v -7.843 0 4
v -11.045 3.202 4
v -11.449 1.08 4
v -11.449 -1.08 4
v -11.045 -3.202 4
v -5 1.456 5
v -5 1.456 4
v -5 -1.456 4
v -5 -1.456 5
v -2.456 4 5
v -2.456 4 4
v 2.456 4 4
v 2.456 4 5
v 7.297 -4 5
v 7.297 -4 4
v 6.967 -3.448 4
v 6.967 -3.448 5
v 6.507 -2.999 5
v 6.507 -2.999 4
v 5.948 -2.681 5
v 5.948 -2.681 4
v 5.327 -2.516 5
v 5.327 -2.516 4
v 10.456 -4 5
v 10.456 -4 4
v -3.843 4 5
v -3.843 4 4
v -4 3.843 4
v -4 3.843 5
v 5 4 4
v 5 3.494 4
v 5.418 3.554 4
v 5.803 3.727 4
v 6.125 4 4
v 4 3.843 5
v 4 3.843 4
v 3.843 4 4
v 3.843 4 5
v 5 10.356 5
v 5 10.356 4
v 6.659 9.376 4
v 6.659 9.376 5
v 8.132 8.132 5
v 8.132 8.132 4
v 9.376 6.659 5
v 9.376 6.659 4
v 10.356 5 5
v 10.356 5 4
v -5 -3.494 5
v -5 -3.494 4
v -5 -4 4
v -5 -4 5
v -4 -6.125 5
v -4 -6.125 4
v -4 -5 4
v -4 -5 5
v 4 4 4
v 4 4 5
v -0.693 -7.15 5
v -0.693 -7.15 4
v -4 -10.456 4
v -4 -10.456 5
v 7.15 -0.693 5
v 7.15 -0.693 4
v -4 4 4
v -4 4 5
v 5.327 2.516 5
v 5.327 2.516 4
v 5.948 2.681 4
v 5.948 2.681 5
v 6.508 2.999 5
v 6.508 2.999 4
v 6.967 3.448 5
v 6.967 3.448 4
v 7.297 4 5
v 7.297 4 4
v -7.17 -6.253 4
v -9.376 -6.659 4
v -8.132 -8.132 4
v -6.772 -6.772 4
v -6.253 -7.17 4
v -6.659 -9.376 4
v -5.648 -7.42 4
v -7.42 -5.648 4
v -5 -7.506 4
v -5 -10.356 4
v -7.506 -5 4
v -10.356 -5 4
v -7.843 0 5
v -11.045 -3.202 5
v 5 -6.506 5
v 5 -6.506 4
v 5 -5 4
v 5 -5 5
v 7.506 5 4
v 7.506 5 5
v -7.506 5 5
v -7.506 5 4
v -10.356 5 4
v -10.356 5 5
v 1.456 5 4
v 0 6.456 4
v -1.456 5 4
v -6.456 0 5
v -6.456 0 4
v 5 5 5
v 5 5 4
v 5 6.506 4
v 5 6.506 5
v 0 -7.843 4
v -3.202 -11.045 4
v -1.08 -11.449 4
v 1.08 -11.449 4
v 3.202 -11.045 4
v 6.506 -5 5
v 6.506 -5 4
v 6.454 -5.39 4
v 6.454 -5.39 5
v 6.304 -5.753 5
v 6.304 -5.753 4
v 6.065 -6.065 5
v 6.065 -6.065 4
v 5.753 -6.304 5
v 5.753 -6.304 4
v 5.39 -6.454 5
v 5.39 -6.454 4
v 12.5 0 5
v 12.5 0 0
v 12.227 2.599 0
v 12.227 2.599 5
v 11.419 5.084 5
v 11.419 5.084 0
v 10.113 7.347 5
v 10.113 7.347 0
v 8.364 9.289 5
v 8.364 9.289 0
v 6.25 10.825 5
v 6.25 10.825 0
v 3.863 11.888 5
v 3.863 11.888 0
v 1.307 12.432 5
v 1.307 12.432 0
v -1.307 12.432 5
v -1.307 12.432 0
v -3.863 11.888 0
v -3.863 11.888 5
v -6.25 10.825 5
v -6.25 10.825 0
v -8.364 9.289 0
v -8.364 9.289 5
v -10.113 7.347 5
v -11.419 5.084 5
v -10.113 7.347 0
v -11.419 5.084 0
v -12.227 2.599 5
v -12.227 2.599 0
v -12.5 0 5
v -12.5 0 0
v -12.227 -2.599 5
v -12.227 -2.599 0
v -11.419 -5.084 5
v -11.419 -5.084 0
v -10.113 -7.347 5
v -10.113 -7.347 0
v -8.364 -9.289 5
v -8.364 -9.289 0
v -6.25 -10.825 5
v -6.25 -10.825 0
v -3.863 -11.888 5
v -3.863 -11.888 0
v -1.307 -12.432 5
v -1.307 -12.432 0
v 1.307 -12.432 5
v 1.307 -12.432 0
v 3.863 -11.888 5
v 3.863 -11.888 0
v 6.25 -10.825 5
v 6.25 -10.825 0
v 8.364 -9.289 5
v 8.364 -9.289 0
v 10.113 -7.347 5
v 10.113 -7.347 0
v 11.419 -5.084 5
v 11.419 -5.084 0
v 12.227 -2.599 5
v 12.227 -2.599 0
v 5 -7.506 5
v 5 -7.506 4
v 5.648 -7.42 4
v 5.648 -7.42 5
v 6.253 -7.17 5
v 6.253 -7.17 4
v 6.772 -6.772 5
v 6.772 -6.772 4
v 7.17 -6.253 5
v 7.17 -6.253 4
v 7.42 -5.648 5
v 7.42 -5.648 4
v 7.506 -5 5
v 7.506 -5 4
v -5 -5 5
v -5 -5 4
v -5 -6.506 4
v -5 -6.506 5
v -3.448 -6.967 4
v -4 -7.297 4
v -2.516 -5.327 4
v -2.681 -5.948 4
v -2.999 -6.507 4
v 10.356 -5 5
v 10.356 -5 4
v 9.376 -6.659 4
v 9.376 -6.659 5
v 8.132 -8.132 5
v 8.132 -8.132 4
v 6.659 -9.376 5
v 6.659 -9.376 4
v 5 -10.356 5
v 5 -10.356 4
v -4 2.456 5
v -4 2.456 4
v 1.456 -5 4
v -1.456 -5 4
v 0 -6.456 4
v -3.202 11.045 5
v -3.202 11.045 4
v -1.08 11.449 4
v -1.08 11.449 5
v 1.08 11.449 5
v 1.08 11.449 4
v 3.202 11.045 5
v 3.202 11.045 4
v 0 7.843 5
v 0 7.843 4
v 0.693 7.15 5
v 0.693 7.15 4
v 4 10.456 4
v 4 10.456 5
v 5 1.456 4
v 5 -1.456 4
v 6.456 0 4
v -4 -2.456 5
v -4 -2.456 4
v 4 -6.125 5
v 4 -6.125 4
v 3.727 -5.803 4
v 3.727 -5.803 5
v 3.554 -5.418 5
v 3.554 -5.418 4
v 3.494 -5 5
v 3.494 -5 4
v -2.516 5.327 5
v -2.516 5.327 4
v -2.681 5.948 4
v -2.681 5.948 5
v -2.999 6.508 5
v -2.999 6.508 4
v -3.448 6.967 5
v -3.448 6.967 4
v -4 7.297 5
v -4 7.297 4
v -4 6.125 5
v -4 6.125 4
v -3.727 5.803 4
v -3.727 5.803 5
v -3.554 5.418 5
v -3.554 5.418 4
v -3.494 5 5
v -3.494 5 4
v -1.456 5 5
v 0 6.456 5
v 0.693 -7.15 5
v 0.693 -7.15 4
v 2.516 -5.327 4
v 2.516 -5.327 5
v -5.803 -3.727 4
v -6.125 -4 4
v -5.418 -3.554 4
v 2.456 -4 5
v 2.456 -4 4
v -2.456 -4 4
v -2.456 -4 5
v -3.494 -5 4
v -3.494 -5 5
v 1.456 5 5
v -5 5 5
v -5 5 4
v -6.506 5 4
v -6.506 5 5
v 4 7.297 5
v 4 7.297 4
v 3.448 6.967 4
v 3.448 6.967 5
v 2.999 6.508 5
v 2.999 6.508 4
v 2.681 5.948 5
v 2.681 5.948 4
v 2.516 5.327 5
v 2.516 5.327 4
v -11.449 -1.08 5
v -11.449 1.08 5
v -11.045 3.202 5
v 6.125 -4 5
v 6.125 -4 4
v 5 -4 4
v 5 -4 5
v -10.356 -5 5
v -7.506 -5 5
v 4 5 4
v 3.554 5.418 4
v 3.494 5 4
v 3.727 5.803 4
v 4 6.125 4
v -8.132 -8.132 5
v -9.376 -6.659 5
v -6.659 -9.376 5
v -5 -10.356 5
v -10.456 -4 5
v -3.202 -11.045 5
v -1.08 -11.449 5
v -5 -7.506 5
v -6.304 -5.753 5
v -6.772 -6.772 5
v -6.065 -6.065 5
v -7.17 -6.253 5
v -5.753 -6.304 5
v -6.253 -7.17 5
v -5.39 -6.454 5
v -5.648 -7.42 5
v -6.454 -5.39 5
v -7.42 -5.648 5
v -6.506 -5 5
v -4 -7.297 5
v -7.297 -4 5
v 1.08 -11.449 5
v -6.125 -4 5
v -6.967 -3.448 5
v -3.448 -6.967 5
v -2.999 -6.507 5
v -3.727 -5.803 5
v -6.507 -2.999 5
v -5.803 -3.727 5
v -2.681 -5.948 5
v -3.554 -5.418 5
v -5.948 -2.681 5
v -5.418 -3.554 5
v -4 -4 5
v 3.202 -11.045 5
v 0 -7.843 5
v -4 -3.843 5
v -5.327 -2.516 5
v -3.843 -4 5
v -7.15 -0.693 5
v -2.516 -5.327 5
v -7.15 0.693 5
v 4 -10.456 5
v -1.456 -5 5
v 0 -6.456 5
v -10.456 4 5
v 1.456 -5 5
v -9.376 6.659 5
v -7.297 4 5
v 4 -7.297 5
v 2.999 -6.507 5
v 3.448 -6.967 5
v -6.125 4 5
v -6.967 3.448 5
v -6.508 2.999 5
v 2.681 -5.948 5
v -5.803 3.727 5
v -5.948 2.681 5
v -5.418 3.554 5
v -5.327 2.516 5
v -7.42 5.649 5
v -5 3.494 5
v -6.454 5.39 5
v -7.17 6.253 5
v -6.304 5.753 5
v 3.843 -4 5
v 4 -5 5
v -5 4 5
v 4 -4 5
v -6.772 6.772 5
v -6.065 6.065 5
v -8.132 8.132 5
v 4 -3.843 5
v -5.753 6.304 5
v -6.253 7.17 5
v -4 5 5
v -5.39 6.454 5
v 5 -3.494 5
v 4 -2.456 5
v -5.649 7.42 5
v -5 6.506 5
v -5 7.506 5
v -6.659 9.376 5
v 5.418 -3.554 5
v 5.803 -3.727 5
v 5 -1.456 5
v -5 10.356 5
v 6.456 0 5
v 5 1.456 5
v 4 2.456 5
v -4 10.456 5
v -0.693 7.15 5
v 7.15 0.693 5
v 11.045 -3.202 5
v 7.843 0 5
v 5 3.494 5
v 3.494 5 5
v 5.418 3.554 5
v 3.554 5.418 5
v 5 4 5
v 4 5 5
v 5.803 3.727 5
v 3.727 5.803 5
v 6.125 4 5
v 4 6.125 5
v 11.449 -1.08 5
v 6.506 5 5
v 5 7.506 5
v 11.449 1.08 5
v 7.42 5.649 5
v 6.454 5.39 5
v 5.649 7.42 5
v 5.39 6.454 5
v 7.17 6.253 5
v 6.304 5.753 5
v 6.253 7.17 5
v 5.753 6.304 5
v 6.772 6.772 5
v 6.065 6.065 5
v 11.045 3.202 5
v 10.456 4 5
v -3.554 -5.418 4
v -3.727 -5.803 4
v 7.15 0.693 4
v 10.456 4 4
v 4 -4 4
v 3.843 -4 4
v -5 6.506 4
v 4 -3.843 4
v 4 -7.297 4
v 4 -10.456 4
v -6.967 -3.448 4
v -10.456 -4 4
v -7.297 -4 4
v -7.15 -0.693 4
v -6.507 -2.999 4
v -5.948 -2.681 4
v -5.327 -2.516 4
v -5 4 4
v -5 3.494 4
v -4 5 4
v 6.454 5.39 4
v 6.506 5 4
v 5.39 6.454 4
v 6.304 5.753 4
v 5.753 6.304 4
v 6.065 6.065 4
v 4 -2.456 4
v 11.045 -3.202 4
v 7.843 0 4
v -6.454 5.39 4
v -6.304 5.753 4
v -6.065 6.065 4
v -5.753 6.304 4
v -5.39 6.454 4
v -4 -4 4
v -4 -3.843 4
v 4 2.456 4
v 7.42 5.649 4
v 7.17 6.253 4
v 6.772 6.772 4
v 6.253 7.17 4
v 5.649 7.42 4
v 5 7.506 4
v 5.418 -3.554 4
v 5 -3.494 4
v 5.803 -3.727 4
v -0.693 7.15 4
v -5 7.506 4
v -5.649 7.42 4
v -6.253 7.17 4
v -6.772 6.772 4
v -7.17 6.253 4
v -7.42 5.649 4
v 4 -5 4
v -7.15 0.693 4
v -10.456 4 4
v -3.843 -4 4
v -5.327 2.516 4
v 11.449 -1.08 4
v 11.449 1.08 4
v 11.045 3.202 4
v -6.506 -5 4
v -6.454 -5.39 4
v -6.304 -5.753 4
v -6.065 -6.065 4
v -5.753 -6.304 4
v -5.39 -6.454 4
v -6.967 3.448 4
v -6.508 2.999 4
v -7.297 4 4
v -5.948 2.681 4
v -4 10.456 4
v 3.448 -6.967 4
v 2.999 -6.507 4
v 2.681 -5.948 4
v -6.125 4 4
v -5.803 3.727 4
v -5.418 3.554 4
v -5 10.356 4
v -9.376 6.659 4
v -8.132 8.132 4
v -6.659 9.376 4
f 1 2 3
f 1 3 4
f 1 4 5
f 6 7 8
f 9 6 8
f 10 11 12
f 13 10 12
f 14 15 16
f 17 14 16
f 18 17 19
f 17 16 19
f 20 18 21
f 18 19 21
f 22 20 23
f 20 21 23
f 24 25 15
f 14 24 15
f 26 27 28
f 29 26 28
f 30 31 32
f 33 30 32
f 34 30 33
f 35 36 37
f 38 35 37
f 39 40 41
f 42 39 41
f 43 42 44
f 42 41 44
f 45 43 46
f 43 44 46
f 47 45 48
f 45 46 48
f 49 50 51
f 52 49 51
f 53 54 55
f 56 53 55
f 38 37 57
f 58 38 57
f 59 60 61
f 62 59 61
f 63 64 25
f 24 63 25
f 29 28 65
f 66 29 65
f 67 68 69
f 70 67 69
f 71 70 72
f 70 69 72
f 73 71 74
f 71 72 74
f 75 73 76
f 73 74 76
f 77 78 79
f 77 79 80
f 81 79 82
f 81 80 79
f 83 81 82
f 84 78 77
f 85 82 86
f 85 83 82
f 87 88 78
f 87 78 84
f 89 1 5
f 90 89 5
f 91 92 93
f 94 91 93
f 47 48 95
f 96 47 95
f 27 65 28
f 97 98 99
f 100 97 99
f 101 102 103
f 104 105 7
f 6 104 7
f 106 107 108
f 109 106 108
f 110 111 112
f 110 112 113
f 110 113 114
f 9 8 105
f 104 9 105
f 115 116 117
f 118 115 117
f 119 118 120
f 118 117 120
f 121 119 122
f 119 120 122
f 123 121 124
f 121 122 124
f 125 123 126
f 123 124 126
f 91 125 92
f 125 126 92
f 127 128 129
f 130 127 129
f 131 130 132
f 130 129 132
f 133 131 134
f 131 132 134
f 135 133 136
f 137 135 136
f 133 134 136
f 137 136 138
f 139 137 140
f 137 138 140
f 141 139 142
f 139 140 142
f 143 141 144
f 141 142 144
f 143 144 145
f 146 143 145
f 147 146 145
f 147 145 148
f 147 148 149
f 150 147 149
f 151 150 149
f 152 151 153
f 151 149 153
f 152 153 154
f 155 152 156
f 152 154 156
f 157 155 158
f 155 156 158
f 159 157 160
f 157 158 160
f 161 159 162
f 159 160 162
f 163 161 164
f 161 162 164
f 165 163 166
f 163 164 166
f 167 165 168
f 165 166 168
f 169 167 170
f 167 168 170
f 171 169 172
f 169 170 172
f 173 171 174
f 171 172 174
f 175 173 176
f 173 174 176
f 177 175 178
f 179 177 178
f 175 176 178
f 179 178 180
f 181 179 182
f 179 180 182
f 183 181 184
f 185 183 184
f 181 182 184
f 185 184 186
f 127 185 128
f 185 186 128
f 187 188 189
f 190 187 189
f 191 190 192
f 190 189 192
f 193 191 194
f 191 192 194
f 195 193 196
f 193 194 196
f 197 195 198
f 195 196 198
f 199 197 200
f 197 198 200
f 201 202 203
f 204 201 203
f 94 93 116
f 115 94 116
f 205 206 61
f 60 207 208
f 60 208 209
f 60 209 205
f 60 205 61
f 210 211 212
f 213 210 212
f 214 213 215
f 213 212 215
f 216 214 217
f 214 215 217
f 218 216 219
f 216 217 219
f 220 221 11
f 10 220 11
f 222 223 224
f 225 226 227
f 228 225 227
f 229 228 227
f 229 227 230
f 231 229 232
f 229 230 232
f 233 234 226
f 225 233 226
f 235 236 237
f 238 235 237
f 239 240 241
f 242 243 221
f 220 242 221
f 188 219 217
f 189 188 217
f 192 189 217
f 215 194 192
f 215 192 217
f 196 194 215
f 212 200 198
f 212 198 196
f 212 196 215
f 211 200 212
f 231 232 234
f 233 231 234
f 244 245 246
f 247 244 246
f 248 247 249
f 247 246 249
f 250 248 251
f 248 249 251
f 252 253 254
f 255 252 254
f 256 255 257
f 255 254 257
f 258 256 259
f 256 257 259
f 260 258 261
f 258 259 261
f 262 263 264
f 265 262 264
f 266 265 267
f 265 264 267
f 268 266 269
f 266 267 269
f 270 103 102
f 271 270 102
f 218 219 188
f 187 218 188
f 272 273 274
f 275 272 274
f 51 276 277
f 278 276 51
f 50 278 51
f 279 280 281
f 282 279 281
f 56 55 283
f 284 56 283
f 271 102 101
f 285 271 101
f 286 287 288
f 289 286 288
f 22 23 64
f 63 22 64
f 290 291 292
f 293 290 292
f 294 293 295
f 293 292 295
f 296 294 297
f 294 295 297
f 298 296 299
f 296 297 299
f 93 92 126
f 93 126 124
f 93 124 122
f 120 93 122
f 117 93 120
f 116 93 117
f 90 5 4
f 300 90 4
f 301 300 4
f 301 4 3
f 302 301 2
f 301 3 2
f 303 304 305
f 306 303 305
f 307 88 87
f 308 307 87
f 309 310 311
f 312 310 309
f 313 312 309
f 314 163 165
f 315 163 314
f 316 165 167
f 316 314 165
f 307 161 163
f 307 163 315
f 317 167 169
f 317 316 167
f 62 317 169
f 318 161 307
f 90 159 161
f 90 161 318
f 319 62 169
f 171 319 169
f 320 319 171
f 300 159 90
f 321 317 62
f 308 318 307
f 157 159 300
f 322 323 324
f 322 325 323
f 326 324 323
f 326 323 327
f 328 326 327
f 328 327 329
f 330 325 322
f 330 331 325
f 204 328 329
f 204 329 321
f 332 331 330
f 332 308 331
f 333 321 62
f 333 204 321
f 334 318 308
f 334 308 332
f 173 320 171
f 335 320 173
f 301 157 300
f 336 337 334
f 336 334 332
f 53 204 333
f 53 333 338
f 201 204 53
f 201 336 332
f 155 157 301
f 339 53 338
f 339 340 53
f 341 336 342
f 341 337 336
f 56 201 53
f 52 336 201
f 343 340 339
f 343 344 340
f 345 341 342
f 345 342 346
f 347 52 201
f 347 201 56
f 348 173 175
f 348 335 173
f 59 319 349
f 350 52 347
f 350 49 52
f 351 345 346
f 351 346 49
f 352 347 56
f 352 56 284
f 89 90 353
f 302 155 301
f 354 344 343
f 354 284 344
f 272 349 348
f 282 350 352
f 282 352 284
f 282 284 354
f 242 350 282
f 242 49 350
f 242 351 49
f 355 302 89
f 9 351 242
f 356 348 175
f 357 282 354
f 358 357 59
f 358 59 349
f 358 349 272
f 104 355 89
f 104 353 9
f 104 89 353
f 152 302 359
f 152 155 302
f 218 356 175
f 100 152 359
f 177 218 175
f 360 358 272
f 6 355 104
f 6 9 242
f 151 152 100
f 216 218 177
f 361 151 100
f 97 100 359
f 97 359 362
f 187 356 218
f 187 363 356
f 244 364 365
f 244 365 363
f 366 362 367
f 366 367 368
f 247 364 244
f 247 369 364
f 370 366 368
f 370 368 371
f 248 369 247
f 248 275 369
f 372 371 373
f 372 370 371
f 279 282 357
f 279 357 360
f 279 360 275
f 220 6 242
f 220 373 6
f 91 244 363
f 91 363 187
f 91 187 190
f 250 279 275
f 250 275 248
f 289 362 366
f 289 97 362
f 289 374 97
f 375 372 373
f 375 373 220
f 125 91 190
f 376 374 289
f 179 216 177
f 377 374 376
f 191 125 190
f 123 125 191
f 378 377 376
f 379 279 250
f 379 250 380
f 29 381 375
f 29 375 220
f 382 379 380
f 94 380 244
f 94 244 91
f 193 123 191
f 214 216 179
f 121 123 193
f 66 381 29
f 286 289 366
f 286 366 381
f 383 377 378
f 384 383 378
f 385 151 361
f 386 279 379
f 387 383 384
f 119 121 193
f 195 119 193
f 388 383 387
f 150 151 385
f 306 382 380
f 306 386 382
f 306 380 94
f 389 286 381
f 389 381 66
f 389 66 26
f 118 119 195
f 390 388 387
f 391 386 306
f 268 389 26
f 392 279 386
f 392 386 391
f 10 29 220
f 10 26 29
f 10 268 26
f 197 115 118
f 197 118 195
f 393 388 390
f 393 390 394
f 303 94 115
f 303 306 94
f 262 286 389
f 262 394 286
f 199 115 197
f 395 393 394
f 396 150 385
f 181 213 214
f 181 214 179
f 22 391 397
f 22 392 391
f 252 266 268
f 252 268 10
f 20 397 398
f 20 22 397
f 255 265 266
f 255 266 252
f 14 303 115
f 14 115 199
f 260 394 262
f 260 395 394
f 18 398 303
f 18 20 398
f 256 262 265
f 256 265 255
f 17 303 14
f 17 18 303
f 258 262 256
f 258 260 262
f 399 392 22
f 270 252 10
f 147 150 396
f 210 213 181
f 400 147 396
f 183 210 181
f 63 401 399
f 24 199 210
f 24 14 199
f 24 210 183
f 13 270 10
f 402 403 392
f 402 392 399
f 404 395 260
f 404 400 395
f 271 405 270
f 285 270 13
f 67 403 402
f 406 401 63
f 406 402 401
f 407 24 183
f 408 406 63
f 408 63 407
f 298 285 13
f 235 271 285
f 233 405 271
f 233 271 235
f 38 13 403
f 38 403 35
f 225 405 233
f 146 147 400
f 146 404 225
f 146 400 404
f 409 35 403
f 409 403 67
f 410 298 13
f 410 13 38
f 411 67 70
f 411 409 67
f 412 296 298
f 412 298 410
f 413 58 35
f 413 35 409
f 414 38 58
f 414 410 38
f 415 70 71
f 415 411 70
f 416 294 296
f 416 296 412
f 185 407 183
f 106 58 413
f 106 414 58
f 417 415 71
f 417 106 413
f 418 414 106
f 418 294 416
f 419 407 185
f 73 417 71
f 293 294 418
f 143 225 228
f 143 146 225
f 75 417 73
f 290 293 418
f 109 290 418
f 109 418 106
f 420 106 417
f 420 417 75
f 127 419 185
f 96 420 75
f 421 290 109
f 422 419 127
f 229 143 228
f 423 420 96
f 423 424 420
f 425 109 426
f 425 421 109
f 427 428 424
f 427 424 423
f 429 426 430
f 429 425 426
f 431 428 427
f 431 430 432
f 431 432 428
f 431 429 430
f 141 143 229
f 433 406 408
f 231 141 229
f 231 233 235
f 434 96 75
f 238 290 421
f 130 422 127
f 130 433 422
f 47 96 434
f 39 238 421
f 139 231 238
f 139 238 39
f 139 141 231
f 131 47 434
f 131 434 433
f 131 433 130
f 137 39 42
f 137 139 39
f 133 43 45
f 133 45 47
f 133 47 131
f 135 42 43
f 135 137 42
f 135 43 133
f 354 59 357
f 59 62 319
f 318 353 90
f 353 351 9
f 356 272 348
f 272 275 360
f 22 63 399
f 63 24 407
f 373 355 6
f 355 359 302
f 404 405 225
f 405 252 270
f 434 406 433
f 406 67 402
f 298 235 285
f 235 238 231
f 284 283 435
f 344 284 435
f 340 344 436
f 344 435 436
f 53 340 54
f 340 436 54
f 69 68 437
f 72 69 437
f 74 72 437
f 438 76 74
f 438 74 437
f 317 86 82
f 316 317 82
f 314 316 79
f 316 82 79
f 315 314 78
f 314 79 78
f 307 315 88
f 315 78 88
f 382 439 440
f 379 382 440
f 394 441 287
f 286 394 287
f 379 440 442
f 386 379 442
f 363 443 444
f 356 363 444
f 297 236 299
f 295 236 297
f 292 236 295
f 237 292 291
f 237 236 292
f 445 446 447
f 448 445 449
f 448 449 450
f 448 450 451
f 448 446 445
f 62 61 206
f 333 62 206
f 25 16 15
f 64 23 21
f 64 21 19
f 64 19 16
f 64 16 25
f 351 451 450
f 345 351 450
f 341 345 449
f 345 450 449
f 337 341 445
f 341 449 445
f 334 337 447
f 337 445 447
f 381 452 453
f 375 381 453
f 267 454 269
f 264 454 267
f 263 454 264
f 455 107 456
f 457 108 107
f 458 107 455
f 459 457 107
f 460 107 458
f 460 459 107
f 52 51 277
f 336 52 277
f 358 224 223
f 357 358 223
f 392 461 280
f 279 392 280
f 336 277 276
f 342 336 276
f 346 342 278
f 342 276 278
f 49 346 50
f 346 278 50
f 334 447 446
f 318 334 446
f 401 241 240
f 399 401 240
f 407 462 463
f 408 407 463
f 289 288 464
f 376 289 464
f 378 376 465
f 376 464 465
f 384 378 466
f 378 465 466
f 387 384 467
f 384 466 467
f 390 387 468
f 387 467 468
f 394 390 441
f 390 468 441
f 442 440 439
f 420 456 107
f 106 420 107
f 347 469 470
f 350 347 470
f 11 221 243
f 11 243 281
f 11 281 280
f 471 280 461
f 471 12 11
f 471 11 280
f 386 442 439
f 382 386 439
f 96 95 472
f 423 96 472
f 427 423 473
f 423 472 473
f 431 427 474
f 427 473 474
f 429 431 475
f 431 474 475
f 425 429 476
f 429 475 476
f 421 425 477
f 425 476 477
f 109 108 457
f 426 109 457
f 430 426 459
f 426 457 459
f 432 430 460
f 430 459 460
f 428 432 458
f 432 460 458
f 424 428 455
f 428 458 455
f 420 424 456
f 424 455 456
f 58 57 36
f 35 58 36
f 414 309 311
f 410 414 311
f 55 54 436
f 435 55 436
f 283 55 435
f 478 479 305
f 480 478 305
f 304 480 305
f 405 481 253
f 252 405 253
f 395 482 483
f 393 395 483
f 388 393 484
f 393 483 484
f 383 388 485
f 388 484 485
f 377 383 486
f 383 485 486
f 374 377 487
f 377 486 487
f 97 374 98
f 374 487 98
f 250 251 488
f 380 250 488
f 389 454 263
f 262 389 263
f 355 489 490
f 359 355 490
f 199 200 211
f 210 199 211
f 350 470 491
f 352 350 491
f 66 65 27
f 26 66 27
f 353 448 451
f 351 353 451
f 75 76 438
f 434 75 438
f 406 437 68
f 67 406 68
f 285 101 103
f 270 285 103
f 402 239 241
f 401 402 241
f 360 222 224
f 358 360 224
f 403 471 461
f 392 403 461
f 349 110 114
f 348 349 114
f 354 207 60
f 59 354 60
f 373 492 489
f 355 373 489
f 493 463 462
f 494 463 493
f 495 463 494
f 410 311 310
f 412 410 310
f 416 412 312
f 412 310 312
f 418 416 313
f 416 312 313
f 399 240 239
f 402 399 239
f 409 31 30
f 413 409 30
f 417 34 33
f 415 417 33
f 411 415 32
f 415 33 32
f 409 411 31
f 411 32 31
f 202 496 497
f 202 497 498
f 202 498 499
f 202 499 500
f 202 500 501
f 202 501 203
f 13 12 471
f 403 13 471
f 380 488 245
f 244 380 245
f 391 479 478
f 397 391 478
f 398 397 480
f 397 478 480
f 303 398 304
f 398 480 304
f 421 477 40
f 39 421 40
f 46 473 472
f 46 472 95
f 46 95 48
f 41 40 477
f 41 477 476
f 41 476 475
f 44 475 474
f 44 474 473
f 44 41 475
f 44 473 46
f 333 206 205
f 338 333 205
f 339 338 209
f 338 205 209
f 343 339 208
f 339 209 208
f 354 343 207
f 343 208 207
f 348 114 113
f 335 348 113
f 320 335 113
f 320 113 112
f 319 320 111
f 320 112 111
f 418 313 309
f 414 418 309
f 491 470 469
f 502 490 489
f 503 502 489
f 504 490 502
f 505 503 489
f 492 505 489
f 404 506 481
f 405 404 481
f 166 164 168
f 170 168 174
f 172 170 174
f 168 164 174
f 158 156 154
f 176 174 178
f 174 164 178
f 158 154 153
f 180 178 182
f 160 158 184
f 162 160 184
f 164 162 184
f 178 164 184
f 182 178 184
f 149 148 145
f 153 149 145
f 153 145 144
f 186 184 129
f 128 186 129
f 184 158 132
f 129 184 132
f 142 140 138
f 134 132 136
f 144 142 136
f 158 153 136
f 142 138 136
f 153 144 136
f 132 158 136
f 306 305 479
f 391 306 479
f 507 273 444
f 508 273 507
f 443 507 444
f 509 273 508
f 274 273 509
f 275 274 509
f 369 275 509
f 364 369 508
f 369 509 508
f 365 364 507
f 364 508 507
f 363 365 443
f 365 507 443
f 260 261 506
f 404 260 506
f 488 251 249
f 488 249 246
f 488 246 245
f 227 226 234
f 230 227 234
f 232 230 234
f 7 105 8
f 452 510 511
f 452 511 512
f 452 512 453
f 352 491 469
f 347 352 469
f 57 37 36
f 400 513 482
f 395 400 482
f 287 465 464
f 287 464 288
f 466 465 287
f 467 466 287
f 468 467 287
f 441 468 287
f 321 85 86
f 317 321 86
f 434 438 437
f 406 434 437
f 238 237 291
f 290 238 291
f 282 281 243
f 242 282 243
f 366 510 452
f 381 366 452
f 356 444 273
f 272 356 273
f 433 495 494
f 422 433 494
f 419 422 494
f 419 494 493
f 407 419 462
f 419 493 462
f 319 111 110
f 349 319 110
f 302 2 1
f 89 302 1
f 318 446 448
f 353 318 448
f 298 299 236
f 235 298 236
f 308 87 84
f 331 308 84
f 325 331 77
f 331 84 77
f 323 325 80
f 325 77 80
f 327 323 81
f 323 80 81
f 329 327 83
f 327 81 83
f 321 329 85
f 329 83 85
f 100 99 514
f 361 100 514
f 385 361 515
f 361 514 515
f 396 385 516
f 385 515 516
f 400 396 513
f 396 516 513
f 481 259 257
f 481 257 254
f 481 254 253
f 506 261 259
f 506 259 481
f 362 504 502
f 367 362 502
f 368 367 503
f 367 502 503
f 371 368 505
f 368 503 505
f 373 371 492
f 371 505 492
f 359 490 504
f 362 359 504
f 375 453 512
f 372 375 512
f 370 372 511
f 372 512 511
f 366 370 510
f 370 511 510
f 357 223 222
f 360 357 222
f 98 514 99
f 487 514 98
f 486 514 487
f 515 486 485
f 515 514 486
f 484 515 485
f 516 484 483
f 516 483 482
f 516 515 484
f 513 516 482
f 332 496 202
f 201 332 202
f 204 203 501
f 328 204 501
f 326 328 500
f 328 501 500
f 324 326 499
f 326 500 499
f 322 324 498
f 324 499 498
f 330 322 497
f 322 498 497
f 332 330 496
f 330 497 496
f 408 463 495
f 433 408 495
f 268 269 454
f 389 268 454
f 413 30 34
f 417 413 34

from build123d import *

# Parameters (mm, degrees)
F0_R     = 12.5
F1_DEPTH = 5
F2_DEPTH = 4


with BuildPart() as f1:
    # F0 (on Top) → F1 (new body)
    with BuildSketch(Plane.XY):
        Circle(F0_R)
        with BuildLine():
            Line((-10.356158, -5), (-7.5055, -5))
            ThreePointArc((-7.5055, -5), (-6.771656, -6.771656), (-5, -7.5055))
            Line((-5, -7.5055), (-5, -10.356158))
            ThreePointArc((-5, -10.356158), (-8.131728, -8.131728), (-10.356158, -5))
        make_face(mode=Mode.SUBTRACT)
        with BuildLine():
            Line((-3.202399, -11.045118), (0, -7.842719))
            Line((0, -7.842719), (3.202399, -11.045118))
            ThreePointArc((3.202399, -11.045118), (0, -11.5), (-3.202399, -11.045118))
        make_face(mode=Mode.SUBTRACT)
        with BuildLine():
            Line((-0.69314, -7.149579), (-4, -10.456439))
            Line((-4, -10.456439), (-4, -7.297288))
            ThreePointArc((-4, -7.297288), (-2.998645, -6.507352), (-2.515906, -5.326813))
            Line((-2.515906, -5.326813), (-0.69314, -7.149579))
        make_face(mode=Mode.SUBTRACT)
        with BuildLine():
            Line((-7.297288, -4), (-10.456439, -4))
            Line((-10.456439, -4), (-7.149579, -0.69314))
            Line((-7.149579, -0.69314), (-5.326813, -2.515906))
            ThreePointArc((-5.326813, -2.515906), (-6.507352, -2.998645), (-7.297288, -4))
        make_face(mode=Mode.SUBTRACT)
        with BuildLine():
            Line((-6.5055, -5), (-5, -5))
            Line((-5, -5), (-5, -6.5055))
            ThreePointArc((-5, -6.5055), (-6.064549, -6.064549), (-6.5055, -5))
        make_face(mode=Mode.SUBTRACT)
        with BuildLine():
            Line((-4, -6.125402), (-4, -5))
            Line((-4, -5), (-3.4945, -5))
            ThreePointArc((-3.4945, -5), (-3.626677, -5.616859), (-4, -6.125402))
        make_face(mode=Mode.SUBTRACT)
        with BuildLine():
            ThreePointArc((-6.125402, -4), (-5.616859, -3.626677), (-5, -3.4945))
            Line((-5, -3.4945), (-5, -4))
            Line((-5, -4), (-6.125402, -4))
        make_face(mode=Mode.SUBTRACT)
        Polygon((-3.842719, -4), (-4, -4), (-4, -3.842719), align=None, mode=Mode.SUBTRACT)
        with BuildLine():
            Line((4, -7.297288), (4, -10.456439))
            Line((4, -10.456439), (0.69314, -7.149579))
            Line((0.69314, -7.149579), (2.515906, -5.326813))
            ThreePointArc((2.515906, -5.326813), (2.998645, -6.507352), (4, -7.297288))
        make_face(mode=Mode.SUBTRACT)
        with BuildLine():
            ThreePointArc((5, -7.5055), (6.771656, -6.771656), (7.5055, -5))
            Line((7.5055, -5), (10.356158, -5))
            ThreePointArc((10.356158, -5), (8.131728, -8.131728), (5, -10.356158))
            Line((5, -10.356158), (5, -7.5055))
        make_face(mode=Mode.SUBTRACT)
        Polygon((-1.456439, -5), (0, -5), (1.456439, -5), (0, -6.456439), align=None, mode=Mode.SUBTRACT)
        with BuildLine():
            Line((3.4945, -5), (4, -5))
            Line((4, -5), (4, -6.125402))
            ThreePointArc((4, -6.125402), (3.626677, -5.616859), (3.4945, -5))
        make_face(mode=Mode.SUBTRACT)
        with BuildLine():
            Line((5, -6.5055), (5, -5))
            Line((5, -5), (6.5055, -5))
            ThreePointArc((6.5055, -5), (6.064549, -6.064549), (5, -6.5055))
        make_face(mode=Mode.SUBTRACT)
        Polygon((4, -4), (3.842719, -4), (4, -3.842719), align=None, mode=Mode.SUBTRACT)
        with BuildLine():
            Line((6.125402, -4), (5, -4))
            Line((5, -4), (5, -3.4945))
            ThreePointArc((5, -3.4945), (5.616859, -3.626677), (6.125402, -4))
        make_face(mode=Mode.SUBTRACT)
        with BuildLine():
            Line((7.149579, -0.69314), (10.456439, -4))
            Line((10.456439, -4), (7.297288, -4))
            ThreePointArc((7.297288, -4), (6.507352, -2.998645), (5.326813, -2.515906))
            Line((5.326813, -2.515906), (7.149579, -0.69314))
        make_face(mode=Mode.SUBTRACT)
        with BuildLine():
            Line((7.842719, 0), (11.045118, 3.202399))
            ThreePointArc((11.045118, 3.202399), (11.5, 0), (11.045118, -3.202399))
            Line((11.045118, -3.202399), (7.842719, 0))
        make_face(mode=Mode.SUBTRACT)
        with BuildLine():
            Line((-7.842719, 0), (-11.045118, -3.202399))
            ThreePointArc((-11.045118, -3.202399), (-11.5, 0), (-11.045118, 3.202399))
            Line((-11.045118, 3.202399), (-7.842719, 0))
        make_face(mode=Mode.SUBTRACT)
        with BuildLine():
            Line((-5.32697, 2.515749), (-7.149579, 0.69314))
            Line((-7.149579, 0.69314), (-10.456439, 4))
            Line((-10.456439, 4), (-7.297479, 4))
            ThreePointArc((-7.297479, 4), (-6.507542, 2.998569), (-5.32697, 2.515749))
        make_face(mode=Mode.SUBTRACT)
        Polygon((-6.456439, 0), (-5, 1.456439), (-5, -1.456439), align=None, mode=Mode.SUBTRACT)
        with BuildLine():
            Line((-6.125402, 4), (-5, 4))
            Line((-5, 4), (-5, 3.4945))
            ThreePointArc((-5, 3.4945), (-5.616859, 3.626677), (-6.125402, 4))
        make_face(mode=Mode.SUBTRACT)
        Polygon((-4, 4), (-3.842719, 4), (-4, 3.842719), align=None, mode=Mode.SUBTRACT)
        with BuildLine():
            Line((-5, 6.5055), (-5, 5))
            Line((-5, 5), (-6.5055, 5))
            ThreePointArc((-6.5055, 5), (-6.064549, 6.064549), (-5, 6.5055))
        make_face(mode=Mode.SUBTRACT)
        with BuildLine():
            ThreePointArc((-4, 6.125402), (-3.626677, 5.616859), (-3.4945, 5))
            Line((-3.4945, 5), (-4, 5))
            Line((-4, 5), (-4, 6.125402))
        make_face(mode=Mode.SUBTRACT)
        with BuildLine():
            ThreePointArc((-10.356158, 5), (-8.131728, 8.131728), (-5, 10.356158))
            Line((-5, 10.356158), (-5, 7.505676))
            ThreePointArc((-5, 7.505676), (-6.77178, 6.77178), (-7.505676, 5))
            Line((-7.505676, 5), (-10.356158, 5))
        make_face(mode=Mode.SUBTRACT)
        with BuildLine():
            Line((-4, 7.297479), (-4, 10.456439))
            Line((-4, 10.456439), (-0.69314, 7.149579))
            Line((-0.69314, 7.149579), (-2.515749, 5.32697))
            ThreePointArc((-2.515749, 5.32697), (-2.998569, 6.507542), (-4, 7.297479))
        make_face(mode=Mode.SUBTRACT)
        Polygon((-4, -2.456439), (-4, 2.456439), (-2.456439, 4), (2.456439, 4), (4, 2.456439), (4, -2.456439), (2.456439, -4), (-2.456439, -4), align=None, mode=Mode.SUBTRACT)
        Polygon((5, -1.456439), (5, 0), (5, 1.456439), (6.456439, 0), align=None, mode=Mode.SUBTRACT)
        Polygon((1.456439, 5), (0, 5), (-1.456439, 5), (0, 6.456439), align=None, mode=Mode.SUBTRACT)
        Polygon((3.842719, 4), (4, 4), (4, 3.842719), align=None, mode=Mode.SUBTRACT)
        with BuildLine():
            ThreePointArc((6.125402, 4), (5.616859, 3.626677), (5, 3.4945))
            Line((5, 3.4945), (5, 4))
            Line((5, 4), (6.125402, 4))
        make_face(mode=Mode.SUBTRACT)
        with BuildLine():
            Line((4, 5), (3.4945, 5))
            ThreePointArc((3.4945, 5), (3.626677, 5.616859), (4, 6.125402))
            Line((4, 6.125402), (4, 5))
        make_face(mode=Mode.SUBTRACT)
        with BuildLine():
            Line((6.5055, 5), (5, 5))
            Line((5, 5), (5, 6.5055))
            ThreePointArc((5, 6.5055), (6.064549, 6.064549), (6.5055, 5))
        make_face(mode=Mode.SUBTRACT)
        with BuildLine():
            Line((7.297479, 4), (10.456439, 4))
            Line((10.456439, 4), (7.149579, 0.69314))
            Line((7.149579, 0.69314), (5.32697, 2.515749))
            ThreePointArc((5.32697, 2.515749), (6.507542, 2.998569), (7.297479, 4))
        make_face(mode=Mode.SUBTRACT)
        with BuildLine():
            Line((0.69314, 7.149579), (4, 10.456439))
            Line((4, 10.456439), (4, 7.297479))
            ThreePointArc((4, 7.297479), (2.998569, 6.507542), (2.515749, 5.32697))
            Line((2.515749, 5.32697), (0.69314, 7.149579))
        make_face(mode=Mode.SUBTRACT)
        with BuildLine():
            Line((0, 7.842719), (-3.202399, 11.045118))
            ThreePointArc((-3.202399, 11.045118), (0, 11.5), (3.202399, 11.045118))
            Line((3.202399, 11.045118), (0, 7.842719))
        make_face(mode=Mode.SUBTRACT)
        with BuildLine():
            ThreePointArc((7.505676, 5), (6.77178, 6.77178), (5, 7.505676))
            Line((5, 7.505676), (5, 10.356158))
            ThreePointArc((5, 10.356158), (8.131728, 8.131728), (10.356158, 5))
            Line((10.356158, 5), (7.505676, 5))
        make_face(mode=Mode.SUBTRACT)
    extrude(amount=F1_DEPTH)

    # F0 (on Top) → F2 (join)
    with BuildSketch(Plane.XY):
        Polygon((-2.456439, 4), (-4, 2.456439), (-4, -2.456439), (-2.456439, -4), (2.456439, -4), (4, -2.456439), (4, 2.456439), (2.456439, 4), align=None)
        Polygon((-5, -1.456439), (-5, 1.456439), (-6.456439, 0), align=None)
        with BuildLine():
            Line((-10.456439, 4), (-7.149579, 0.69314))
            Line((-7.149579, 0.69314), (-5.32697, 2.515749))
            ThreePointArc((-5.32697, 2.515749), (-6.507542, 2.998569), (-7.297479, 4))
            Line((-7.297479, 4), (-10.456439, 4))
        make_face()
        with BuildLine():
            ThreePointArc((-11.045118, 3.202399), (-11.5, 0), (-11.045118, -3.202399))
            Line((-11.045118, -3.202399), (-7.842719, 0))
            Line((-7.842719, 0), (-11.045118, 3.202399))
        make_face()
        with BuildLine():
            Line((-7.149579, -0.69314), (-10.456439, -4))
            Line((-10.456439, -4), (-7.297288, -4))
            ThreePointArc((-7.297288, -4), (-6.507352, -2.998645), (-5.326813, -2.515906))
            Line((-5.326813, -2.515906), (-7.149579, -0.69314))
        make_face()
        with BuildLine():
            ThreePointArc((-5, -7.5055), (-6.771656, -6.771656), (-7.5055, -5))
            Line((-7.5055, -5), (-10.356158, -5))
            ThreePointArc((-10.356158, -5), (-8.131728, -8.131728), (-5, -10.356158))
            Line((-5, -10.356158), (-5, -7.5055))
        make_face()
        with BuildLine():
            Line((-4, -7.297288), (-4, -10.456439))
            Line((-4, -10.456439), (-0.69314, -7.149579))
            Line((-0.69314, -7.149579), (-2.515906, -5.326813))
            ThreePointArc((-2.515906, -5.326813), (-2.998645, -6.507352), (-4, -7.297288))
        make_face()
        with BuildLine():
            Line((3.202399, -11.045118), (0, -7.842719))
            Line((0, -7.842719), (-3.202399, -11.045118))
            ThreePointArc((-3.202399, -11.045118), (0, -11.5), (3.202399, -11.045118))
        make_face()
        with BuildLine():
            Line((0.69314, -7.149579), (4, -10.456439))
            Line((4, -10.456439), (4, -7.297288))
            ThreePointArc((4, -7.297288), (2.998645, -6.507352), (2.515906, -5.326813))
            Line((2.515906, -5.326813), (0.69314, -7.149579))
        make_face()
        Polygon((1.456439, -5), (0, -5), (-1.456439, -5), (0, -6.456439), align=None)
        with BuildLine():
            Line((10.356158, -5), (7.5055, -5))
            ThreePointArc((7.5055, -5), (6.771656, -6.771656), (5, -7.5055))
            Line((5, -7.5055), (5, -10.356158))
            ThreePointArc((5, -10.356158), (8.131728, -8.131728), (10.356158, -5))
        make_face()
        with BuildLine():
            Line((7.297288, -4), (10.456439, -4))
            Line((10.456439, -4), (7.149579, -0.69314))
            Line((7.149579, -0.69314), (5.326813, -2.515906))
            ThreePointArc((5.326813, -2.515906), (6.507352, -2.998645), (7.297288, -4))
        make_face()
        with BuildLine():
            ThreePointArc((11.045118, -3.202399), (11.5, 0), (11.045118, 3.202399))
            Line((11.045118, 3.202399), (7.842719, 0))
            Line((7.842719, 0), (11.045118, -3.202399))
        make_face()
        with BuildLine():
            Line((7.149579, 0.69314), (10.456439, 4))
            Line((10.456439, 4), (7.297479, 4))
            ThreePointArc((7.297479, 4), (6.507542, 2.998569), (5.32697, 2.515749))
            Line((5.32697, 2.515749), (7.149579, 0.69314))
        make_face()
        Polygon((5, 1.456439), (5, 0), (5, -1.456439), (6.456439, 0), align=None)
        with BuildLine():
            Line((5, 10.356158), (5, 7.505676))
            ThreePointArc((5, 7.505676), (6.77178, 6.77178), (7.505676, 5))
            Line((7.505676, 5), (10.356158, 5))
            ThreePointArc((10.356158, 5), (8.131728, 8.131728), (5, 10.356158))
        make_face()
        with BuildLine():
            Line((4, 7.297479), (4, 10.456439))
            Line((4, 10.456439), (0.69314, 7.149579))
            Line((0.69314, 7.149579), (2.515749, 5.32697))
            ThreePointArc((2.515749, 5.32697), (2.998569, 6.507542), (4, 7.297479))
        make_face()
        with BuildLine():
            ThreePointArc((3.202399, 11.045118), (0, 11.5), (-3.202399, 11.045118))
            Line((-3.202399, 11.045118), (0, 7.842719))
            Line((0, 7.842719), (3.202399, 11.045118))
        make_face()
        with BuildLine():
            Line((-0.69314, 7.149579), (-4, 10.456439))
            Line((-4, 10.456439), (-4, 7.297479))
            ThreePointArc((-4, 7.297479), (-2.998569, 6.507542), (-2.515749, 5.32697))
            Line((-2.515749, 5.32697), (-0.69314, 7.149579))
        make_face()
        with BuildLine():
            Line((-5, 7.505676), (-5, 10.356158))
            ThreePointArc((-5, 10.356158), (-8.131728, 8.131728), (-10.356158, 5))
            Line((-10.356158, 5), (-7.505676, 5))
            ThreePointArc((-7.505676, 5), (-6.77178, 6.77178), (-5, 7.505676))
        make_face()
        Polygon((-1.456439, 5), (0, 5), (1.456439, 5), (0, 6.456439), align=None)
        with BuildLine():
            Line((-6.5055, 5), (-5, 5))
            Line((-5, 5), (-5, 6.5055))
            ThreePointArc((-5, 6.5055), (-6.064549, 6.064549), (-6.5055, 5))
        make_face()
        with BuildLine():
            Line((-4, 5), (-3.4945, 5))
            ThreePointArc((-3.4945, 5), (-3.626677, 5.616859), (-4, 6.125402))
            Line((-4, 6.125402), (-4, 5))
        make_face()
        with BuildLine():
            Line((-5, 3.4945), (-5, 4))
            Line((-5, 4), (-6.125402, 4))
            ThreePointArc((-6.125402, 4), (-5.616859, 3.626677), (-5, 3.4945))
        make_face()
        with BuildLine():
            Line((-5, -4), (-5, -3.4945))
            ThreePointArc((-5, -3.4945), (-5.616859, -3.626677), (-6.125402, -4))
            Line((-6.125402, -4), (-5, -4))
        make_face()
        with BuildLine():
            Line((-5, -6.5055), (-5, -5))
            Line((-5, -5), (-6.5055, -5))
            ThreePointArc((-6.5055, -5), (-6.064549, -6.064549), (-5, -6.5055))
        make_face()
        with BuildLine():
            Line((-3.4945, -5), (-4, -5))
            Line((-4, -5), (-4, -6.125402))
            ThreePointArc((-4, -6.125402), (-3.626677, -5.616859), (-3.4945, -5))
        make_face()
        with BuildLine():
            Line((5, -3.4945), (5, -4))
            Line((5, -4), (6.125402, -4))
            ThreePointArc((6.125402, -4), (5.616859, -3.626677), (5, -3.4945))
        make_face()
        with BuildLine():
            Line((6.5055, -5), (5, -5))
            Line((5, -5), (5, -6.5055))
            ThreePointArc((5, -6.5055), (6.064549, -6.064549), (6.5055, -5))
        make_face()
        with BuildLine():
            Line((4, -6.125402), (4, -5))
            Line((4, -5), (3.4945, -5))
            ThreePointArc((3.4945, -5), (3.626677, -5.616859), (4, -6.125402))
        make_face()
        with BuildLine():
            Line((5, 4), (5, 3.4945))
            ThreePointArc((5, 3.4945), (5.616859, 3.626677), (6.125402, 4))
            Line((6.125402, 4), (5, 4))
        make_face()
        with BuildLine():
            Line((5, 6.5055), (5, 5))
            Line((5, 5), (6.5055, 5))
            ThreePointArc((6.5055, 5), (6.064549, 6.064549), (5, 6.5055))
        make_face()
        with BuildLine():
            ThreePointArc((4, 6.125402), (3.626677, 5.616859), (3.4945, 5))
            Line((3.4945, 5), (4, 5))
            Line((4, 5), (4, 6.125402))
        make_face()
        Polygon((4, 3.842719), (4, 4), (3.842719, 4), align=None)
        Polygon((4, -3.842719), (3.842719, -4), (4, -4), align=None)
        Polygon((-4, -3.842719), (-4, -4), (-3.842719, -4), align=None)
        Polygon((-4, 3.842719), (-3.842719, 4), (-4, 4), align=None)
    extrude(amount=F2_DEPTH)


solid = f1.part
